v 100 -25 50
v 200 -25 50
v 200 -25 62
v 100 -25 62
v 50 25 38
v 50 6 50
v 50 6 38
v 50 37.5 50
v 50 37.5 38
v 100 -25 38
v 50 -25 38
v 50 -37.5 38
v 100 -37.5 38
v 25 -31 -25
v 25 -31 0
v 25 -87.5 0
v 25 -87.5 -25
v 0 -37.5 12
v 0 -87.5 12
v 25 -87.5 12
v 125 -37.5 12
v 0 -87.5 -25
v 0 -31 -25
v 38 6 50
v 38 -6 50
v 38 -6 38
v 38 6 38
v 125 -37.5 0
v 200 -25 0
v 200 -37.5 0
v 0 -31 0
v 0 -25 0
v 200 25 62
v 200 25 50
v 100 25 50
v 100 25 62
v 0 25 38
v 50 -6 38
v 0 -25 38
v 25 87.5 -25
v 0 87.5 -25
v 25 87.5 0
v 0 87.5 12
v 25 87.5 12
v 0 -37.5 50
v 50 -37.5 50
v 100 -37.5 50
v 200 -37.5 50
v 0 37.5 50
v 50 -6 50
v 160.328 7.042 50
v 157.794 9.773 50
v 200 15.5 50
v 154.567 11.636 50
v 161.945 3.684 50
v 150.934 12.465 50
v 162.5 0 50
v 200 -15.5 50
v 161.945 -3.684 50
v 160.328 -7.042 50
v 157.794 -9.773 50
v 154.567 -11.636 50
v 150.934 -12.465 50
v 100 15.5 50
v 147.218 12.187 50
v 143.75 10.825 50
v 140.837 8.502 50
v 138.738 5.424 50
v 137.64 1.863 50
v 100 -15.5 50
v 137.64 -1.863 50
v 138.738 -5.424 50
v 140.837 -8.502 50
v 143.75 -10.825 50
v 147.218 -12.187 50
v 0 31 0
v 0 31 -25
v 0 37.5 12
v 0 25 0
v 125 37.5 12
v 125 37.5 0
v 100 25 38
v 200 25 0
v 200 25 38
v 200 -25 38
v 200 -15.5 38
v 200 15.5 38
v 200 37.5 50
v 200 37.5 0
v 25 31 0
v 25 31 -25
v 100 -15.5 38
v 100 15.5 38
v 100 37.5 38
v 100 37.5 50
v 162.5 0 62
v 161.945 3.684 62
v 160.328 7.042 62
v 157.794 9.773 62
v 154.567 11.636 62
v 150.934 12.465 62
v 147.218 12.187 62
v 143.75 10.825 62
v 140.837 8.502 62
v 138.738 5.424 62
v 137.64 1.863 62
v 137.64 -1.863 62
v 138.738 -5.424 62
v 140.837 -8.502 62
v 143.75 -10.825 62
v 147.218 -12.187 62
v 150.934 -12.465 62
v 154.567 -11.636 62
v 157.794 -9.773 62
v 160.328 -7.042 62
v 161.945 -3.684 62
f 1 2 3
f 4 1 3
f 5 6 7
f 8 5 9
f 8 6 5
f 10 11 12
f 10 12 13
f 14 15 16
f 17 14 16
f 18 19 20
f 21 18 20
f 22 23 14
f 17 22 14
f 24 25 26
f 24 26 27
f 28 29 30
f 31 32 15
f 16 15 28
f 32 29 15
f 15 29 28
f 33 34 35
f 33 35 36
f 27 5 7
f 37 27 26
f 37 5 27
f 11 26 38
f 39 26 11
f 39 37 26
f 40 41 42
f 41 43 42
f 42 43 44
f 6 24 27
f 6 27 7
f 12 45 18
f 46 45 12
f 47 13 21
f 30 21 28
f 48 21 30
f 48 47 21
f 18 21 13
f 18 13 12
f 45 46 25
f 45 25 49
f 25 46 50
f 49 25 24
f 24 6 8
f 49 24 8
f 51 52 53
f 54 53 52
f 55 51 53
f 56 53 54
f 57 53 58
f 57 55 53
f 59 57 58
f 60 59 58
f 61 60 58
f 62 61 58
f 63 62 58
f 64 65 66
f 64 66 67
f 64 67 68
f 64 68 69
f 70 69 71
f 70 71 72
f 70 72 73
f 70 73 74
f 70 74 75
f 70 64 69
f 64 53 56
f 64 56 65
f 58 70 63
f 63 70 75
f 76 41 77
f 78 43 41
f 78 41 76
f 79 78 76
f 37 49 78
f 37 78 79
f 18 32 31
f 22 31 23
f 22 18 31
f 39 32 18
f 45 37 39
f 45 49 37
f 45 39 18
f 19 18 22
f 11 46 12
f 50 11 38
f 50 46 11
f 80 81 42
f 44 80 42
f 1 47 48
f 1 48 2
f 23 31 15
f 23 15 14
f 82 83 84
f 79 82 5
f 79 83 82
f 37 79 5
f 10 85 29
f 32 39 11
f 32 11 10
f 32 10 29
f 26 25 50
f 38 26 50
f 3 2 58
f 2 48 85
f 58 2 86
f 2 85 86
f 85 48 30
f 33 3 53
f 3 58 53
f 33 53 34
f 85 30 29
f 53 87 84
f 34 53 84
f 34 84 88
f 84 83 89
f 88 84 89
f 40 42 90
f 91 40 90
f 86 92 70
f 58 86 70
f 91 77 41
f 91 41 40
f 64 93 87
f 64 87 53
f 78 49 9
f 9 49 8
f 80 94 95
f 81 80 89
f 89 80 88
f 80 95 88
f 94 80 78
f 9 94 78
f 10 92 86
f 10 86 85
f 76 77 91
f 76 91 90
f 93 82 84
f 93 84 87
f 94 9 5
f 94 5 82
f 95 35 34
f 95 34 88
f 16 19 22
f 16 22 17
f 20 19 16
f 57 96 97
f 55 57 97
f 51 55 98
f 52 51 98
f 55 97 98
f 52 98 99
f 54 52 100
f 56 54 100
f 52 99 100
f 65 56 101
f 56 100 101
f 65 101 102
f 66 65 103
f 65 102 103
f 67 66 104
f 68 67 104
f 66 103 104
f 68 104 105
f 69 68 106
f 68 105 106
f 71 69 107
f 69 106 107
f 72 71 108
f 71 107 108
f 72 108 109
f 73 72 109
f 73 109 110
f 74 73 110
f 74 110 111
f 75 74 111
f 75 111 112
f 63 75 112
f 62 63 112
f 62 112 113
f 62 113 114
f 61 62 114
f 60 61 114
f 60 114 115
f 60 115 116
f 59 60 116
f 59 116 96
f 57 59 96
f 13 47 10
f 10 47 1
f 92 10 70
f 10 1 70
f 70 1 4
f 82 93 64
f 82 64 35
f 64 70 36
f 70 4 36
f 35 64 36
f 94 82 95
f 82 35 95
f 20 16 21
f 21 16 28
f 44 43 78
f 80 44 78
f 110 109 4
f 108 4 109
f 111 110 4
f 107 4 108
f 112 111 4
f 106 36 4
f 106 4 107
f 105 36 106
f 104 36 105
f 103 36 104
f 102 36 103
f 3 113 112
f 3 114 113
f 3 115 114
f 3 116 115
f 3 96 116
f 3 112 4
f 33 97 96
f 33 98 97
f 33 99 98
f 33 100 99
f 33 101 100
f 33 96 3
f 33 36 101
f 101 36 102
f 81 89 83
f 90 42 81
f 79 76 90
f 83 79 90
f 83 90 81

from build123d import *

# Parameters (mm, degrees)
PAD_DEPTH       = 62
SKETCH001_W     = 174.899156
SKETCH001_H     = 58.891647
SKETCH001_W_2   = 149.195125
SKETCH001_H_2   = 63.358872
POCKET_DEPTH    = 50
SKETCH002_W     = 24.450794
SKETCH002_H     = 18.2717568888
SKETCH002_W_2   = 25.01263
POCKET001_DEPTH = 200.001
SKETCH003_W     = 109.462605
SKETCH003_H     = 100.191001
POCKET002_DEPTH = 12
SKETCH004_W     = 50
SKETCH004_H     = 111.170834
POCKET003_DEPTH = 12
SKETCH005_W     = 25
SKETCH005_H     = 175
PAD001_DEPTH    = 25
POCKET004_DEPTH = 200.001
SKETCH007_W     = 31
SKETCH007_H     = 12
POCKET005_DEPTH = 100.001
SKETCH008_R     = 12.5
POCKET006_DEPTH = 87.001
SKETCH009_W     = 25.552227
SKETCH009_H     = 12
POCKET007_DEPTH = 75.001


with BuildPart() as part:
    # Sketch → Pad (new body)
    with BuildSketch(Plane.XY):
        Polygon((0, 87.5), (0, -87.5), (25, -87.5), (125, -37.5), (200, -37.5), (200, 37.5), (125, 37.5), (25, 87.5), align=None)
    extrude(amount=PAD_DEPTH)

    # Sketch001 → Pocket (cut)
    with BuildSketch(Plane.XY.offset(62)):
        with Locations((66.856742, 66.9458235)):
            Rectangle(SKETCH001_W, SKETCH001_H)
        with Locations((63.5040375, -69.179436)):
            Rectangle(SKETCH001_W_2, SKETCH001_H_2)
    extrude(amount=-POCKET_DEPTH, mode=Mode.SUBTRACT)

    # Sketch002 → Pocket001 (cut, through all)
    with BuildSketch(Plane.YZ.offset(200)):
        with Locations((-37.225397, 59.1358784444)):
            Rectangle(SKETCH002_W, SKETCH002_H)
        with Locations((37.506315, 59.1358784444)):
            Rectangle(SKETCH002_W_2, SKETCH002_H)
    extrude(amount=-POCKET001_DEPTH, mode=Mode.SUBTRACT)

    # Sketch003 → Pocket002 (cut)
    with BuildSketch(Plane.XY.offset(62)):
        with Locations((45.2686975, 1.1479225)):
            Rectangle(SKETCH003_W, SKETCH003_H)
    extrude(amount=-POCKET002_DEPTH, mode=Mode.SUBTRACT)

    # Sketch004 → Pocket003 (cut)
    with BuildSketch(Plane.XY.offset(50)):
        with Locations((75, 0.690428)):
            Rectangle(SKETCH004_W, SKETCH004_H)
    extrude(amount=-POCKET003_DEPTH, mode=Mode.SUBTRACT)

    # Sketch005 → Pad001 (new body)
    with BuildSketch(Plane(origin=(0, 0, 0), x_dir=(1, 0, 0), z_dir=(0, 0, -1))):
        with Locations((12.5, 0)):
            Rectangle(SKETCH005_W, SKETCH005_H)
    extrude(amount=PAD001_DEPTH)

    # Sketch006 → Pocket004 (cut, through all)
    with BuildSketch(Plane(origin=(0, 0, 0), x_dir=(0, -1, 0), z_dir=(-1, 0, 0))):
        Polygon((-25, 38), (25, 38), (25, 0), (31, 0), (31, -41.126076), (-31, -41.126076), (-31, 0), (-25, 0), align=None)
    extrude(amount=-POCKET004_DEPTH, mode=Mode.SUBTRACT)

    # Sketch007 → Pocket005 (cut, through all)
    with BuildSketch(Plane(origin=(100, 0, 0), x_dir=(0, -1, 0), z_dir=(-1, 0, 0))):
        with Locations((0, 44)):
            Rectangle(SKETCH007_W, SKETCH007_H)
    extrude(amount=-POCKET005_DEPTH, mode=Mode.SUBTRACT)

    # Sketch008 → Pocket006 (cut, through all)
    with BuildSketch(Plane.XY.offset(62)):
        with Locations((150, 0)):
            Circle(SKETCH008_R)
    extrude(amount=-POCKET006_DEPTH, mode=Mode.SUBTRACT)

    # Sketch009 → Pocket007 (cut, through all)
    with BuildSketch(Plane.XY.offset(50)):
        with Locations((50.7761135, 0)):
            Rectangle(SKETCH009_W, SKETCH009_H)
    extrude(amount=-POCKET007_DEPTH, mode=Mode.SUBTRACT)


solid = part.part
